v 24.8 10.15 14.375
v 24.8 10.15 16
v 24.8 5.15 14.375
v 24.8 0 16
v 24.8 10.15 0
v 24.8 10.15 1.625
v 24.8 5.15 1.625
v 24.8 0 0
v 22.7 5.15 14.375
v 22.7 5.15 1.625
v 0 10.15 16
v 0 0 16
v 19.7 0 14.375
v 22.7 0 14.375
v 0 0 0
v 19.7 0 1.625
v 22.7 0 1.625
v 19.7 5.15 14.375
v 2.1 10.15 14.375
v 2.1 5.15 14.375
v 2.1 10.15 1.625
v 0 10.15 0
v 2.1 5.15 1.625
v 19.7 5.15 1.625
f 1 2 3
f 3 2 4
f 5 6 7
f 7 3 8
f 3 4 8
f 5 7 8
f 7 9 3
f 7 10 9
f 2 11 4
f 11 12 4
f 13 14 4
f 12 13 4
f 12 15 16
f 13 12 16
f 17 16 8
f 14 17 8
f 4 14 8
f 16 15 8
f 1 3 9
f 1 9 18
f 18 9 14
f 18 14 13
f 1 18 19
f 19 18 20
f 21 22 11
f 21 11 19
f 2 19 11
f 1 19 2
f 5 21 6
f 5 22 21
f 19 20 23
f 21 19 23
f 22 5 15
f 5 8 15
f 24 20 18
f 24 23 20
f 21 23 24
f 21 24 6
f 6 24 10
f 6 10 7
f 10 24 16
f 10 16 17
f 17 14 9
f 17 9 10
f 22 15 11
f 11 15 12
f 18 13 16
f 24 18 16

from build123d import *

# Parameters (mm, degrees)
SKETCH2_W           = 24.8
SKETCH2_H           = 16
SKETCH2_W_2         = 3
SKETCH2_H_2         = 12.75
BOSS_EXTRUDE1_DEPTH = 5.15
BOSS_EXTRUDE2_DEPTH = 5


with BuildPart() as part:
    # Sketch2 → Boss-Extrude1 (new body)
    with BuildSketch(Plane(origin=(0, 0, 0), x_dir=(1, 0, 0), z_dir=(0, 1, 0))):
        with Locations((12.4, -8)):
            Rectangle(SKETCH2_W, SKETCH2_H)
        with Locations((21.2, -8)):
            Rectangle(SKETCH2_W_2, SKETCH2_H_2, mode=Mode.SUBTRACT)
    extrude(amount=BOSS_EXTRUDE1_DEPTH)

    # Sketch4 → Boss-Extrude2 (add)
    with BuildSketch(Plane(origin=(0, 5.15, 0), x_dir=(1, 0, 0), z_dir=(0, 1, 0))):
        Polygon((2.1, -1.625), (19.7, -1.625), (22.7, -1.625), (24.8, -1.625), (24.8, 0), (0, 0), (0, -16), (24.8, -16), (24.8, -14.375), (22.7, -14.375), (19.7, -14.375), (2.1, -14.375), align=None)
    extrude(amount=BOSS_EXTRUDE2_DEPTH)


solid = part.part
